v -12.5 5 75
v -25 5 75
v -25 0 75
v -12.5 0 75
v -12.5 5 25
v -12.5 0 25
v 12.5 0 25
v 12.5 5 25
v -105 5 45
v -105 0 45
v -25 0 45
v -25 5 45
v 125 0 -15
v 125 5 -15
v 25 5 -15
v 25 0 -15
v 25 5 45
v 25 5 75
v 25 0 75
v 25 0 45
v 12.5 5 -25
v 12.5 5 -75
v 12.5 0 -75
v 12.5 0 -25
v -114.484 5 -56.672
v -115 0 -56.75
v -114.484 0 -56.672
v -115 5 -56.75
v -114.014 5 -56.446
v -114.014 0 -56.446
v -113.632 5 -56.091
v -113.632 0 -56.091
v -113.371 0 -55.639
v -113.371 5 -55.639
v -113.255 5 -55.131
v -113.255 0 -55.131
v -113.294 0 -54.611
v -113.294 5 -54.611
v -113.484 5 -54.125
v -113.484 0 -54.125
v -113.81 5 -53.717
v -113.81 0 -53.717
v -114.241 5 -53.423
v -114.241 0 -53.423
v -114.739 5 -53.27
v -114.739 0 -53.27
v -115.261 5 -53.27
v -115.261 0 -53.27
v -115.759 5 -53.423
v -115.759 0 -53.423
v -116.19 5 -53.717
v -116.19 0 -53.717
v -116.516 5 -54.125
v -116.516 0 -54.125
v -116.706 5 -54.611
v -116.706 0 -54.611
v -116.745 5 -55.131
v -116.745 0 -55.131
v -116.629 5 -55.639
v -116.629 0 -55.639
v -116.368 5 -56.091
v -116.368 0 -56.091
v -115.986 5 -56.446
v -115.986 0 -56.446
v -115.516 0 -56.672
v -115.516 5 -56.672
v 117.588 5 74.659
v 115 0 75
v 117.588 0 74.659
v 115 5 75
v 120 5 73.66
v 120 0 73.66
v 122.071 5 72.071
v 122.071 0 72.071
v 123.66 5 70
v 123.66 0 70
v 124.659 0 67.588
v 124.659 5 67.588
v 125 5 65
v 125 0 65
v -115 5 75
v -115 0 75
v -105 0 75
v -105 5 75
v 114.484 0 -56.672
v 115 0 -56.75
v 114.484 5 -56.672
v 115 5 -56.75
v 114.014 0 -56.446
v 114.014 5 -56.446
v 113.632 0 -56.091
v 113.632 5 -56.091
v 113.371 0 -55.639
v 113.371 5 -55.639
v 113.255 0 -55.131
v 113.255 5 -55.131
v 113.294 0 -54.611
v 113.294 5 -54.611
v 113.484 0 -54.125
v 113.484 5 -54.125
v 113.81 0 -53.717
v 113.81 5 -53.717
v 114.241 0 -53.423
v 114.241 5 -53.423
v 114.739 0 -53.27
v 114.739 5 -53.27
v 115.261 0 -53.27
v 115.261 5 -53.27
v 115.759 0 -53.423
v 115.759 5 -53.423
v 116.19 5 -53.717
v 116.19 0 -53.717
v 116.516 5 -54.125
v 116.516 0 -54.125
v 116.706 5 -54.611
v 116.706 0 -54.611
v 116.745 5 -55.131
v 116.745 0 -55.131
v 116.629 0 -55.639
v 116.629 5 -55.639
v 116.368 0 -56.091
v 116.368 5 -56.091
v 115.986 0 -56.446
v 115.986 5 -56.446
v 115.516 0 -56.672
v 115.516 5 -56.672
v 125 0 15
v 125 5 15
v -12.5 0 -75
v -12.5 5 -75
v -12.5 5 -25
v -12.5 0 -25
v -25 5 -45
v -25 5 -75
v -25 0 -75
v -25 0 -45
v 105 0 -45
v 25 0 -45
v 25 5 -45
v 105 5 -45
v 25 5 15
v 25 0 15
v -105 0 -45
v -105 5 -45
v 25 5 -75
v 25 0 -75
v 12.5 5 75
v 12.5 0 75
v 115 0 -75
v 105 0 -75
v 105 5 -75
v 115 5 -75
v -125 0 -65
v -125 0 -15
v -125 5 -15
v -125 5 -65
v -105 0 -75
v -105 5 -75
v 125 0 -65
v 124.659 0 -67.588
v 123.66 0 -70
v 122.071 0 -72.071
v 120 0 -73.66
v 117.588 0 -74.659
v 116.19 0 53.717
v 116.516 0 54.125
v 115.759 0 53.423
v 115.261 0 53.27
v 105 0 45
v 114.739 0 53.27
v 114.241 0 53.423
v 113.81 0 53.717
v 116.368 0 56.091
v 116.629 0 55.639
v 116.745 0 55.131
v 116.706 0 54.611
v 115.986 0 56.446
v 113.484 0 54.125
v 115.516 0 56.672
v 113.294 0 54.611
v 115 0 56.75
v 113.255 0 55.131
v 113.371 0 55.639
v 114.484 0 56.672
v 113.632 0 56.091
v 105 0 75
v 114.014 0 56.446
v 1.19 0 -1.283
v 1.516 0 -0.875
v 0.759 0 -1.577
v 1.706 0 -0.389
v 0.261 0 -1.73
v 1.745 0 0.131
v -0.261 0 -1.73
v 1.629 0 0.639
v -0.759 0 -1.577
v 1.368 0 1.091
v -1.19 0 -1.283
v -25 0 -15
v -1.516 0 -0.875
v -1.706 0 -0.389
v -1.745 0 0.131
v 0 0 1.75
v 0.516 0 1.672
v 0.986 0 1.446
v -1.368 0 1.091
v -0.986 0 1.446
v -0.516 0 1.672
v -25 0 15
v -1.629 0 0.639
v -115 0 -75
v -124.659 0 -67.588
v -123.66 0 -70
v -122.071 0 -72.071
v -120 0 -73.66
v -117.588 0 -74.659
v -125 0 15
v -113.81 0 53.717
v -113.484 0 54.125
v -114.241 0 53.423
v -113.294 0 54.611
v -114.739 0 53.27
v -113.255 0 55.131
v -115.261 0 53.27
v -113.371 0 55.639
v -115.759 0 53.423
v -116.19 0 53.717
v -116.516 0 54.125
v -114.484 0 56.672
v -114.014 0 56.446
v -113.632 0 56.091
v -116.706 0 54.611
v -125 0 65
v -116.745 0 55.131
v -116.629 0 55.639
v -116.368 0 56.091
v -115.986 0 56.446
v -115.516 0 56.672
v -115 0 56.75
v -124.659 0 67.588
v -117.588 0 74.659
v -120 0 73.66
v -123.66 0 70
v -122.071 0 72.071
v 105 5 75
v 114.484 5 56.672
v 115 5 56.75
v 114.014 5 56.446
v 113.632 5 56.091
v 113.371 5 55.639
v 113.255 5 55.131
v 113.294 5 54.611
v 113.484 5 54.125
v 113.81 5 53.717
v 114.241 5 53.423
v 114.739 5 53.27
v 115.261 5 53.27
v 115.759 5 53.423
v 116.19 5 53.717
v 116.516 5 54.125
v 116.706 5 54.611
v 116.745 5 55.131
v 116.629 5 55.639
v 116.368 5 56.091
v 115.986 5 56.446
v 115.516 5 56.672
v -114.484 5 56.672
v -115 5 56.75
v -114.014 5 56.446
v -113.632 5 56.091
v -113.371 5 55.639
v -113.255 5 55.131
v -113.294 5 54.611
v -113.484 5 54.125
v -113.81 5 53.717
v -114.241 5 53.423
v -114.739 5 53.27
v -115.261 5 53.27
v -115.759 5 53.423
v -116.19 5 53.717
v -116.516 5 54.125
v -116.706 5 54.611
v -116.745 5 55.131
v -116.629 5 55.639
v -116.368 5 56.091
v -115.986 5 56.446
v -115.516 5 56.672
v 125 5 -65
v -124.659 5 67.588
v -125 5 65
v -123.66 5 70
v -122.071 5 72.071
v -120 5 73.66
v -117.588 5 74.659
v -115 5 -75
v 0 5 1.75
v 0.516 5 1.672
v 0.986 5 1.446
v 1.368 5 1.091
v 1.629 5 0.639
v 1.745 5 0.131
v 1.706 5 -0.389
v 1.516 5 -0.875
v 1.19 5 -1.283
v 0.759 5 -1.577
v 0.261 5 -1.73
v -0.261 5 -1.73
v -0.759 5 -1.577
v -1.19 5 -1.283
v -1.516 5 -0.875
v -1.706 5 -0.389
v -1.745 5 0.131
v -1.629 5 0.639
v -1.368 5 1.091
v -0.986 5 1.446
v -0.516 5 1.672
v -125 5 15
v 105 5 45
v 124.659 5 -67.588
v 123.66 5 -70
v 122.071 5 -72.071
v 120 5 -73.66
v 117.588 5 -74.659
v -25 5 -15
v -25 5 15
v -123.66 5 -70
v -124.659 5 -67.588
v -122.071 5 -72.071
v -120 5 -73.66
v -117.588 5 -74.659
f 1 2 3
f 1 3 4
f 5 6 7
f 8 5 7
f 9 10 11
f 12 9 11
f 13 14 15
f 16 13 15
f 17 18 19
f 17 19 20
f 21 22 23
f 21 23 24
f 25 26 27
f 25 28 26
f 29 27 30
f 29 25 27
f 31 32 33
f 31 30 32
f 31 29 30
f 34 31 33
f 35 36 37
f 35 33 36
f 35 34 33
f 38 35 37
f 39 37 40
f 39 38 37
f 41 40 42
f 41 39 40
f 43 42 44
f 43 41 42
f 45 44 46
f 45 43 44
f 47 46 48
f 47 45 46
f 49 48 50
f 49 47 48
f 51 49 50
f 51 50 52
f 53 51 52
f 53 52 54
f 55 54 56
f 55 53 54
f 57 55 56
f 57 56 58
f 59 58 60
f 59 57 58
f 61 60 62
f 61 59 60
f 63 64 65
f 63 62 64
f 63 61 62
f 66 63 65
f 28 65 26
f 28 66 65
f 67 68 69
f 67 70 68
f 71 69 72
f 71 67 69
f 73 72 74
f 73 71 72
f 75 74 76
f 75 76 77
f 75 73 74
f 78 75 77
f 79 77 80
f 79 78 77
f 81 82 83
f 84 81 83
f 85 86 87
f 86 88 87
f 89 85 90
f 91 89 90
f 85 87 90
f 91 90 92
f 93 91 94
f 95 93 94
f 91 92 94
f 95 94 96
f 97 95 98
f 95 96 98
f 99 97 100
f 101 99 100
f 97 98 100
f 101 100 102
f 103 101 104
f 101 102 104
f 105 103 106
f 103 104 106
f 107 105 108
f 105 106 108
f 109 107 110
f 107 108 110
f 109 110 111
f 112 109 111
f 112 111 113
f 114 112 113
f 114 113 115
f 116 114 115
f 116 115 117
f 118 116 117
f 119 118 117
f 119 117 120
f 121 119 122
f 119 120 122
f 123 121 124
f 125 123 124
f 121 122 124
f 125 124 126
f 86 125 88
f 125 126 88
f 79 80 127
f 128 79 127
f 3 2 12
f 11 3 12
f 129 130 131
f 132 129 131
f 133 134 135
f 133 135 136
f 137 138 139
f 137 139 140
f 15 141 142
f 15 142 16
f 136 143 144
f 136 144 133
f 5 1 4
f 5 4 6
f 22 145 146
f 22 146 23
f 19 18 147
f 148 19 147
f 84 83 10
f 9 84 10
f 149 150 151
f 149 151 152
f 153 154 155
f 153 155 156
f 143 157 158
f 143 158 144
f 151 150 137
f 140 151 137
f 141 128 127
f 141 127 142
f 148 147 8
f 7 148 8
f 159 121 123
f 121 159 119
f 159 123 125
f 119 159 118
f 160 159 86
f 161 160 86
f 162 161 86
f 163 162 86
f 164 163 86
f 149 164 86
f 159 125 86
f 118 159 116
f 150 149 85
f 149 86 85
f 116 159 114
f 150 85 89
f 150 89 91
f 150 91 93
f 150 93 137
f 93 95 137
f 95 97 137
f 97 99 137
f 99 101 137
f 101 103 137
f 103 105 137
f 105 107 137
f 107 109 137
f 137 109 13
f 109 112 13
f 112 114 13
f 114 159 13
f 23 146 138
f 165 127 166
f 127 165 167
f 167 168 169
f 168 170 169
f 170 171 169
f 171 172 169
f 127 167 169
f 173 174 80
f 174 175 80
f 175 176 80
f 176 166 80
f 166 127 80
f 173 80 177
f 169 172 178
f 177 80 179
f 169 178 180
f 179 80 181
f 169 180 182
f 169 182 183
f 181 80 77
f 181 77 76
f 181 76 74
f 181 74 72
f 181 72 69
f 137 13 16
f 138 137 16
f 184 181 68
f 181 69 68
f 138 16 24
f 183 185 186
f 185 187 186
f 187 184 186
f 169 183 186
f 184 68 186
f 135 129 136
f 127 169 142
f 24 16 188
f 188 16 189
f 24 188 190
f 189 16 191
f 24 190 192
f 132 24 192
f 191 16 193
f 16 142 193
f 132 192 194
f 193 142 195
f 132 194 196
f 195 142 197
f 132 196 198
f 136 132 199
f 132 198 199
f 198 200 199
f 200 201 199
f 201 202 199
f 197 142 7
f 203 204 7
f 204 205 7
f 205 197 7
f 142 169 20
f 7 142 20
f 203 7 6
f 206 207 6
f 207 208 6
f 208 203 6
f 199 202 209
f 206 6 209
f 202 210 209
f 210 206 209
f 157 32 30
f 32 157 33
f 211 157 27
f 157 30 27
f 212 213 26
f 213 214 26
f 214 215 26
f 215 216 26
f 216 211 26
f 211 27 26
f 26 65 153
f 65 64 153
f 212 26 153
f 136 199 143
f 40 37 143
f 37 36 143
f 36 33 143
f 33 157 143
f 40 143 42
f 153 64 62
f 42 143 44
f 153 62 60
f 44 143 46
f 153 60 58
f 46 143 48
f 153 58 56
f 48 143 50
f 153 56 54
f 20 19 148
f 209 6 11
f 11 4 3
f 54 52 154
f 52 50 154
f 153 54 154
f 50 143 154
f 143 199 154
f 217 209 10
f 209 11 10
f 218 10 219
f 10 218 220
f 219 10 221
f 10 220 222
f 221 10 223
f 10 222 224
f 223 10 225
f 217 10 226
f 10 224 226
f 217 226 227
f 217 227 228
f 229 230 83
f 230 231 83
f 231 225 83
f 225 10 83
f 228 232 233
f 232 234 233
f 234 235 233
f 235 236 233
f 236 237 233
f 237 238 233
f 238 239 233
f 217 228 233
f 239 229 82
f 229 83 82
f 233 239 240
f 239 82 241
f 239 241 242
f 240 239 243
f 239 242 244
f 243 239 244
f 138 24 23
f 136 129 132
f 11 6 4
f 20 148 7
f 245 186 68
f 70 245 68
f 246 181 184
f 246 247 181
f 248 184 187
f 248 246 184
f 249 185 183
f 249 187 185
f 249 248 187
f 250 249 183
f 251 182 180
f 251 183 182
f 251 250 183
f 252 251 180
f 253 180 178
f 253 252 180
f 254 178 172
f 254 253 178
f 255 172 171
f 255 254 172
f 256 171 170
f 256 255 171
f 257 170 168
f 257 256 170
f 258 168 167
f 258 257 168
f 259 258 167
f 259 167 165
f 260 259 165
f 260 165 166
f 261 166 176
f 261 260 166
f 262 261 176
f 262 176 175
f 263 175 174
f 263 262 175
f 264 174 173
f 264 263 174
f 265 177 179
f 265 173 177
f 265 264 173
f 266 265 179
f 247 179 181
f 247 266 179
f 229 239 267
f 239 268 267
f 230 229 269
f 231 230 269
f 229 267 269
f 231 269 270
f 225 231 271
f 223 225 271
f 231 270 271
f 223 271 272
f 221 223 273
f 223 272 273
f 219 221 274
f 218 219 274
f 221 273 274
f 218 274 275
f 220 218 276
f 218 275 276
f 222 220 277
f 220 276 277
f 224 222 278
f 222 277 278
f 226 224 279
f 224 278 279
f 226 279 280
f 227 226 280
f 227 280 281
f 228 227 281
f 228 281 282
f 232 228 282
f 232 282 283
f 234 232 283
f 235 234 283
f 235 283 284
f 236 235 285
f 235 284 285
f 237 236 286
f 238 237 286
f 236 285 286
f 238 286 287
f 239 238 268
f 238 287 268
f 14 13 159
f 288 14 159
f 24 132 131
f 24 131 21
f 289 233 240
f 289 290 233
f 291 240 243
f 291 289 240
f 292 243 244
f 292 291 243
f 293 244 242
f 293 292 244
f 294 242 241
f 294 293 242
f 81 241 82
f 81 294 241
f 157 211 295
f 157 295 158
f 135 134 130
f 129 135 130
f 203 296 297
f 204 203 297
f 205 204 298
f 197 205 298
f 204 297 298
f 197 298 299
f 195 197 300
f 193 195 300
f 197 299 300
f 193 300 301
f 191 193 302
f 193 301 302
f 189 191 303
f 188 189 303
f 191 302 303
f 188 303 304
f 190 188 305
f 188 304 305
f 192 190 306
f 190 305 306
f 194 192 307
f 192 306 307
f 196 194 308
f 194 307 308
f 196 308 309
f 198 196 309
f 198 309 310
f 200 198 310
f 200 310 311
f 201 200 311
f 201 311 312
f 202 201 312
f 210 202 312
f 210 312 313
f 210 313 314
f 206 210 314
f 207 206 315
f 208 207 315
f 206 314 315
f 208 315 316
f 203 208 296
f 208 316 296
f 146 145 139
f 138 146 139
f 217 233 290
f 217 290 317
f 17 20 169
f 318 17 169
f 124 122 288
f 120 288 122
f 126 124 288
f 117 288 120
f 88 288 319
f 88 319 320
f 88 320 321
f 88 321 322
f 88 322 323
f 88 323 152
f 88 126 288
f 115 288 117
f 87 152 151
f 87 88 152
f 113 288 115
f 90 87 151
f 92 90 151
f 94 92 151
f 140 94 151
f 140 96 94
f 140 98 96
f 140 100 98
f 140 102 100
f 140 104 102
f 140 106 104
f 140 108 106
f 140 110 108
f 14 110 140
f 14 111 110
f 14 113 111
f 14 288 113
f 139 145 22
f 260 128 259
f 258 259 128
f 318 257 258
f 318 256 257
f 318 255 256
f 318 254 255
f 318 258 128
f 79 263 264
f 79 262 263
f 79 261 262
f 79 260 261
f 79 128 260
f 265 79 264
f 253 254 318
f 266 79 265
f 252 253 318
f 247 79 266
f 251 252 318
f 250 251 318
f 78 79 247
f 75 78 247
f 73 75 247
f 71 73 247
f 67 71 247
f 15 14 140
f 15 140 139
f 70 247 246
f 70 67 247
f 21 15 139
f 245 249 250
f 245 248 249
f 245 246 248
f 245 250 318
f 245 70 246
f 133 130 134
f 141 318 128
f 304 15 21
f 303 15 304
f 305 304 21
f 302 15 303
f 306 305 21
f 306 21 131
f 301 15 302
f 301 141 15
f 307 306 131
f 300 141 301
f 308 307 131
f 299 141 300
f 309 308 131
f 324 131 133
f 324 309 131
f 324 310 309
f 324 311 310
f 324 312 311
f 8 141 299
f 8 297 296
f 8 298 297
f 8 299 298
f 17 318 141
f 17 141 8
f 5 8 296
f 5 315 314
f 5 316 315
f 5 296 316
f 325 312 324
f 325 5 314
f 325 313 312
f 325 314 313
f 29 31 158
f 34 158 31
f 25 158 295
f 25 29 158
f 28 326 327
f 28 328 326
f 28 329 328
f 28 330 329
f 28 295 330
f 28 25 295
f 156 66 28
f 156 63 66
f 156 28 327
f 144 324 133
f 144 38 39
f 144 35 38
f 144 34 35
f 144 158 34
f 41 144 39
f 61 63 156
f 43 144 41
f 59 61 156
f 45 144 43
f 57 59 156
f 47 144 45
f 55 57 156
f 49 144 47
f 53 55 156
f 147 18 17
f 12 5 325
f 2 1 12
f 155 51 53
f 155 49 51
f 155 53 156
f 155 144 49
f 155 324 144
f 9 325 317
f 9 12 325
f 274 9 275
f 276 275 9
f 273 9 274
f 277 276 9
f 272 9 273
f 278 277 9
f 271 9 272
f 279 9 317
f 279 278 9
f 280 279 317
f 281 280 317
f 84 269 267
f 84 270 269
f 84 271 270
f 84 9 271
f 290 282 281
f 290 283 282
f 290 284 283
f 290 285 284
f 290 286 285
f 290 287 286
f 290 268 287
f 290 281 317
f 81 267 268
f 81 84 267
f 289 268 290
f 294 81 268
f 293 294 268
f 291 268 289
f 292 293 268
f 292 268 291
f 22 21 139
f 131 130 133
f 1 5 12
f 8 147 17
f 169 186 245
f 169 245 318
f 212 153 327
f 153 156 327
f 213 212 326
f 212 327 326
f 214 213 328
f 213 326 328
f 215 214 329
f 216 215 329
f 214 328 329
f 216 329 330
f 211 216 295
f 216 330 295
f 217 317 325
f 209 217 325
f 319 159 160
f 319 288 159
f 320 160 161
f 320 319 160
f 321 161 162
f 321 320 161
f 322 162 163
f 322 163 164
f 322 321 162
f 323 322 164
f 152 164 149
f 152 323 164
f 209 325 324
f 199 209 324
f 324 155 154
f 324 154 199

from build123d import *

# Parameters (mm, degrees)
SKETCH_1_W                                 = 250
SKETCH_1_H                                 = 150
EXTRUDE_1_DEPTH                            = 5
FILLET_1_R                                 = 10
SKETCH_2_R                                 = 1.75
CUT_EXTRUDE_1_DEPTH                        = 146.859521458
MIRROR_2_COPY_1_SKETCH_R                   = 1.75
MIRROR_2_COPY_1_DEPTH                      = 146.859521458
SKETCH_4_R                                 = 1.75
CUT_EXTRUDE_2_DEPTH                        = 5
SKETCH_5_W                                 = 25
SKETCH_5_H                                 = 50
CUT_EXTRUDE_3_DEPTH                        = 5
SKETCH_7_W                                 = 210
SKETCH_7_H                                 = 30
CUT_EXTRUDE_4_DEPTH                        = 5
SKETCH_8_W                                 = 12.5
SKETCH_8_H                                 = 30
EXTRUDE_2_DEPTH                            = 5
MIRROR_5_AT_THE_SECOND_PLANE_COPY_1_SKET_W = 12.5
MIRROR_5_AT_THE_SECOND_PLANE_COPY_1_SKET_H = 30
MIRROR_5_AT_THE_SECOND_PLANE_COPY_1_DEPTH  = 5
SKETCH_9_W                                 = 100
SKETCH_9_H                                 = 30
CUT_EXTRUDE_5_DEPTH                        = 5


with BuildPart() as part:
    # 草图1 → 凸台-拉伸1 (new body)
    with BuildSketch(Plane(origin=(0, 0, 0), x_dir=(1, 0, 0), z_dir=(0, 1, 0))):
        Rectangle(SKETCH_1_W, SKETCH_1_H)
    extrude(amount=EXTRUDE_1_DEPTH)

    # 圆角1
    fillet_1_edges = [part.edges().sort_by_distance(p)[0] for p in [
        (-125, 2.5, -75),
        (125, 2.5, -75),
        (125, 2.5, 75),
        (-125, 2.5, 75),
    ]]
    fillet(fillet_1_edges, radius=FILLET_1_R)

    # 草图2 → 切除-拉伸1 (cut, symmetric)
    with BuildSketch(Plane(origin=(0, 5, 0), x_dir=(1, 0, 0), z_dir=(0, 1, 0))):
        with Locations(Location((-115, -55, 0), (0, 0, 270))):
            Circle(SKETCH_2_R)
    cut_extrude_1 = extrude(amount=CUT_EXTRUDE_1_DEPTH, both=True, mode=Mode.SUBTRACT)

    # 镜向1: 切除-拉伸1 across plane
    add(cut_extrude_1.mirror(Plane.XY), mode=Mode.SUBTRACT)

    # 镜向2: 切除-拉伸1 across plane
    add(cut_extrude_1.mirror(Plane(origin=(0, 0, 0), x_dir=(0, 0, 1), z_dir=(1, 0, 0))), mode=Mode.SUBTRACT)

    # 镜向2 copy 1 sketch → 镜向2 copy 1 (cut, symmetric)
    with BuildSketch(Plane(origin=(0, 5, 0), x_dir=(-1, 0, 0), z_dir=(0, 1, 0))):
        with Locations(Location((-115, -55, 0), (0, 0, 270))):
            Circle(MIRROR_2_COPY_1_SKETCH_R)
    extrude(amount=MIRROR_2_COPY_1_DEPTH, both=True, mode=Mode.SUBTRACT)

    # 草图4 → 切除-拉伸2 (cut)
    with BuildSketch(Plane(origin=(0, 5, 0), x_dir=(1, 0, 0), z_dir=(0, 1, 0))):
        with Locations(Location((0, 0, 0), (0, 0, 270))):
            Circle(SKETCH_4_R)
    extrude(amount=-CUT_EXTRUDE_2_DEPTH, mode=Mode.SUBTRACT)

    # 草图5 → 切除-拉伸3 (cut)
    with BuildSketch(Plane.XZ):
        with Locations((0, 50)):
            Rectangle(SKETCH_5_W, SKETCH_5_H)
    cut_extrude_3 = extrude(amount=-CUT_EXTRUDE_3_DEPTH, mode=Mode.SUBTRACT)

    # 草图7 → 切除-拉伸4 (cut)
    with BuildSketch(Plane.XZ):
        with Locations((0, -60)):
            Rectangle(SKETCH_7_W, SKETCH_7_H)
    cut_extrude_4 = extrude(amount=-CUT_EXTRUDE_4_DEPTH, mode=Mode.SUBTRACT)

    # 镜向3: 切除-拉伸4 across plane
    add(cut_extrude_4.mirror(Plane.XY), mode=Mode.SUBTRACT)

    # 镜向4: 切除-拉伸3 across plane
    add(cut_extrude_3.mirror(Plane.XY), mode=Mode.SUBTRACT)

    # 草图8 → 凸台-拉伸2 (add)
    with BuildSketch(Plane(origin=(0, 5, 0), x_dir=(1, 0, 0), z_dir=(0, 1, 0))):
        with Locations((-18.75, -60)):
            Rectangle(SKETCH_8_W, SKETCH_8_H)
    extrude_2 = extrude(amount=-EXTRUDE_2_DEPTH)

    # 镜向5: 凸台-拉伸2 across plane
    add(extrude_2.mirror(Plane(origin=(0, 0, 0), x_dir=(0, 0, 1), z_dir=(1, 0, 0))))

    # 镜向5 at the second plane: 凸台-拉伸2 across plane
    add(extrude_2.mirror(Plane.XY))

    # 镜向5 at the second plane copy 1 sket → 镜向5 at the second plane copy 1 (add)
    with BuildSketch(Plane(origin=(0, 5, 0), x_dir=(-1, 0, 0), z_dir=(0, 1, 0))):
        with Locations((-18.75, -60)):
            Rectangle(MIRROR_5_AT_THE_SECOND_PLANE_COPY_1_SKET_W, MIRROR_5_AT_THE_SECOND_PLANE_COPY_1_SKET_H)
    extrude(amount=-MIRROR_5_AT_THE_SECOND_PLANE_COPY_1_DEPTH)

    # 草图9 → 切除-拉伸5 (cut)
    with BuildSketch(Plane(origin=(0, 5, 0), x_dir=(1, 0, 0), z_dir=(0, 1, 0))):
        with Locations((-75, 0)):
            Rectangle(SKETCH_9_W, SKETCH_9_H)
    cut_extrude_5 = extrude(amount=-CUT_EXTRUDE_5_DEPTH, mode=Mode.SUBTRACT)

    # 镜向6: 切除-拉伸5 across plane
    add(cut_extrude_5.mirror(Plane(origin=(0, 0, 0), x_dir=(0, 0, 1), z_dir=(1, 0, 0))), mode=Mode.SUBTRACT)


solid = part.part
